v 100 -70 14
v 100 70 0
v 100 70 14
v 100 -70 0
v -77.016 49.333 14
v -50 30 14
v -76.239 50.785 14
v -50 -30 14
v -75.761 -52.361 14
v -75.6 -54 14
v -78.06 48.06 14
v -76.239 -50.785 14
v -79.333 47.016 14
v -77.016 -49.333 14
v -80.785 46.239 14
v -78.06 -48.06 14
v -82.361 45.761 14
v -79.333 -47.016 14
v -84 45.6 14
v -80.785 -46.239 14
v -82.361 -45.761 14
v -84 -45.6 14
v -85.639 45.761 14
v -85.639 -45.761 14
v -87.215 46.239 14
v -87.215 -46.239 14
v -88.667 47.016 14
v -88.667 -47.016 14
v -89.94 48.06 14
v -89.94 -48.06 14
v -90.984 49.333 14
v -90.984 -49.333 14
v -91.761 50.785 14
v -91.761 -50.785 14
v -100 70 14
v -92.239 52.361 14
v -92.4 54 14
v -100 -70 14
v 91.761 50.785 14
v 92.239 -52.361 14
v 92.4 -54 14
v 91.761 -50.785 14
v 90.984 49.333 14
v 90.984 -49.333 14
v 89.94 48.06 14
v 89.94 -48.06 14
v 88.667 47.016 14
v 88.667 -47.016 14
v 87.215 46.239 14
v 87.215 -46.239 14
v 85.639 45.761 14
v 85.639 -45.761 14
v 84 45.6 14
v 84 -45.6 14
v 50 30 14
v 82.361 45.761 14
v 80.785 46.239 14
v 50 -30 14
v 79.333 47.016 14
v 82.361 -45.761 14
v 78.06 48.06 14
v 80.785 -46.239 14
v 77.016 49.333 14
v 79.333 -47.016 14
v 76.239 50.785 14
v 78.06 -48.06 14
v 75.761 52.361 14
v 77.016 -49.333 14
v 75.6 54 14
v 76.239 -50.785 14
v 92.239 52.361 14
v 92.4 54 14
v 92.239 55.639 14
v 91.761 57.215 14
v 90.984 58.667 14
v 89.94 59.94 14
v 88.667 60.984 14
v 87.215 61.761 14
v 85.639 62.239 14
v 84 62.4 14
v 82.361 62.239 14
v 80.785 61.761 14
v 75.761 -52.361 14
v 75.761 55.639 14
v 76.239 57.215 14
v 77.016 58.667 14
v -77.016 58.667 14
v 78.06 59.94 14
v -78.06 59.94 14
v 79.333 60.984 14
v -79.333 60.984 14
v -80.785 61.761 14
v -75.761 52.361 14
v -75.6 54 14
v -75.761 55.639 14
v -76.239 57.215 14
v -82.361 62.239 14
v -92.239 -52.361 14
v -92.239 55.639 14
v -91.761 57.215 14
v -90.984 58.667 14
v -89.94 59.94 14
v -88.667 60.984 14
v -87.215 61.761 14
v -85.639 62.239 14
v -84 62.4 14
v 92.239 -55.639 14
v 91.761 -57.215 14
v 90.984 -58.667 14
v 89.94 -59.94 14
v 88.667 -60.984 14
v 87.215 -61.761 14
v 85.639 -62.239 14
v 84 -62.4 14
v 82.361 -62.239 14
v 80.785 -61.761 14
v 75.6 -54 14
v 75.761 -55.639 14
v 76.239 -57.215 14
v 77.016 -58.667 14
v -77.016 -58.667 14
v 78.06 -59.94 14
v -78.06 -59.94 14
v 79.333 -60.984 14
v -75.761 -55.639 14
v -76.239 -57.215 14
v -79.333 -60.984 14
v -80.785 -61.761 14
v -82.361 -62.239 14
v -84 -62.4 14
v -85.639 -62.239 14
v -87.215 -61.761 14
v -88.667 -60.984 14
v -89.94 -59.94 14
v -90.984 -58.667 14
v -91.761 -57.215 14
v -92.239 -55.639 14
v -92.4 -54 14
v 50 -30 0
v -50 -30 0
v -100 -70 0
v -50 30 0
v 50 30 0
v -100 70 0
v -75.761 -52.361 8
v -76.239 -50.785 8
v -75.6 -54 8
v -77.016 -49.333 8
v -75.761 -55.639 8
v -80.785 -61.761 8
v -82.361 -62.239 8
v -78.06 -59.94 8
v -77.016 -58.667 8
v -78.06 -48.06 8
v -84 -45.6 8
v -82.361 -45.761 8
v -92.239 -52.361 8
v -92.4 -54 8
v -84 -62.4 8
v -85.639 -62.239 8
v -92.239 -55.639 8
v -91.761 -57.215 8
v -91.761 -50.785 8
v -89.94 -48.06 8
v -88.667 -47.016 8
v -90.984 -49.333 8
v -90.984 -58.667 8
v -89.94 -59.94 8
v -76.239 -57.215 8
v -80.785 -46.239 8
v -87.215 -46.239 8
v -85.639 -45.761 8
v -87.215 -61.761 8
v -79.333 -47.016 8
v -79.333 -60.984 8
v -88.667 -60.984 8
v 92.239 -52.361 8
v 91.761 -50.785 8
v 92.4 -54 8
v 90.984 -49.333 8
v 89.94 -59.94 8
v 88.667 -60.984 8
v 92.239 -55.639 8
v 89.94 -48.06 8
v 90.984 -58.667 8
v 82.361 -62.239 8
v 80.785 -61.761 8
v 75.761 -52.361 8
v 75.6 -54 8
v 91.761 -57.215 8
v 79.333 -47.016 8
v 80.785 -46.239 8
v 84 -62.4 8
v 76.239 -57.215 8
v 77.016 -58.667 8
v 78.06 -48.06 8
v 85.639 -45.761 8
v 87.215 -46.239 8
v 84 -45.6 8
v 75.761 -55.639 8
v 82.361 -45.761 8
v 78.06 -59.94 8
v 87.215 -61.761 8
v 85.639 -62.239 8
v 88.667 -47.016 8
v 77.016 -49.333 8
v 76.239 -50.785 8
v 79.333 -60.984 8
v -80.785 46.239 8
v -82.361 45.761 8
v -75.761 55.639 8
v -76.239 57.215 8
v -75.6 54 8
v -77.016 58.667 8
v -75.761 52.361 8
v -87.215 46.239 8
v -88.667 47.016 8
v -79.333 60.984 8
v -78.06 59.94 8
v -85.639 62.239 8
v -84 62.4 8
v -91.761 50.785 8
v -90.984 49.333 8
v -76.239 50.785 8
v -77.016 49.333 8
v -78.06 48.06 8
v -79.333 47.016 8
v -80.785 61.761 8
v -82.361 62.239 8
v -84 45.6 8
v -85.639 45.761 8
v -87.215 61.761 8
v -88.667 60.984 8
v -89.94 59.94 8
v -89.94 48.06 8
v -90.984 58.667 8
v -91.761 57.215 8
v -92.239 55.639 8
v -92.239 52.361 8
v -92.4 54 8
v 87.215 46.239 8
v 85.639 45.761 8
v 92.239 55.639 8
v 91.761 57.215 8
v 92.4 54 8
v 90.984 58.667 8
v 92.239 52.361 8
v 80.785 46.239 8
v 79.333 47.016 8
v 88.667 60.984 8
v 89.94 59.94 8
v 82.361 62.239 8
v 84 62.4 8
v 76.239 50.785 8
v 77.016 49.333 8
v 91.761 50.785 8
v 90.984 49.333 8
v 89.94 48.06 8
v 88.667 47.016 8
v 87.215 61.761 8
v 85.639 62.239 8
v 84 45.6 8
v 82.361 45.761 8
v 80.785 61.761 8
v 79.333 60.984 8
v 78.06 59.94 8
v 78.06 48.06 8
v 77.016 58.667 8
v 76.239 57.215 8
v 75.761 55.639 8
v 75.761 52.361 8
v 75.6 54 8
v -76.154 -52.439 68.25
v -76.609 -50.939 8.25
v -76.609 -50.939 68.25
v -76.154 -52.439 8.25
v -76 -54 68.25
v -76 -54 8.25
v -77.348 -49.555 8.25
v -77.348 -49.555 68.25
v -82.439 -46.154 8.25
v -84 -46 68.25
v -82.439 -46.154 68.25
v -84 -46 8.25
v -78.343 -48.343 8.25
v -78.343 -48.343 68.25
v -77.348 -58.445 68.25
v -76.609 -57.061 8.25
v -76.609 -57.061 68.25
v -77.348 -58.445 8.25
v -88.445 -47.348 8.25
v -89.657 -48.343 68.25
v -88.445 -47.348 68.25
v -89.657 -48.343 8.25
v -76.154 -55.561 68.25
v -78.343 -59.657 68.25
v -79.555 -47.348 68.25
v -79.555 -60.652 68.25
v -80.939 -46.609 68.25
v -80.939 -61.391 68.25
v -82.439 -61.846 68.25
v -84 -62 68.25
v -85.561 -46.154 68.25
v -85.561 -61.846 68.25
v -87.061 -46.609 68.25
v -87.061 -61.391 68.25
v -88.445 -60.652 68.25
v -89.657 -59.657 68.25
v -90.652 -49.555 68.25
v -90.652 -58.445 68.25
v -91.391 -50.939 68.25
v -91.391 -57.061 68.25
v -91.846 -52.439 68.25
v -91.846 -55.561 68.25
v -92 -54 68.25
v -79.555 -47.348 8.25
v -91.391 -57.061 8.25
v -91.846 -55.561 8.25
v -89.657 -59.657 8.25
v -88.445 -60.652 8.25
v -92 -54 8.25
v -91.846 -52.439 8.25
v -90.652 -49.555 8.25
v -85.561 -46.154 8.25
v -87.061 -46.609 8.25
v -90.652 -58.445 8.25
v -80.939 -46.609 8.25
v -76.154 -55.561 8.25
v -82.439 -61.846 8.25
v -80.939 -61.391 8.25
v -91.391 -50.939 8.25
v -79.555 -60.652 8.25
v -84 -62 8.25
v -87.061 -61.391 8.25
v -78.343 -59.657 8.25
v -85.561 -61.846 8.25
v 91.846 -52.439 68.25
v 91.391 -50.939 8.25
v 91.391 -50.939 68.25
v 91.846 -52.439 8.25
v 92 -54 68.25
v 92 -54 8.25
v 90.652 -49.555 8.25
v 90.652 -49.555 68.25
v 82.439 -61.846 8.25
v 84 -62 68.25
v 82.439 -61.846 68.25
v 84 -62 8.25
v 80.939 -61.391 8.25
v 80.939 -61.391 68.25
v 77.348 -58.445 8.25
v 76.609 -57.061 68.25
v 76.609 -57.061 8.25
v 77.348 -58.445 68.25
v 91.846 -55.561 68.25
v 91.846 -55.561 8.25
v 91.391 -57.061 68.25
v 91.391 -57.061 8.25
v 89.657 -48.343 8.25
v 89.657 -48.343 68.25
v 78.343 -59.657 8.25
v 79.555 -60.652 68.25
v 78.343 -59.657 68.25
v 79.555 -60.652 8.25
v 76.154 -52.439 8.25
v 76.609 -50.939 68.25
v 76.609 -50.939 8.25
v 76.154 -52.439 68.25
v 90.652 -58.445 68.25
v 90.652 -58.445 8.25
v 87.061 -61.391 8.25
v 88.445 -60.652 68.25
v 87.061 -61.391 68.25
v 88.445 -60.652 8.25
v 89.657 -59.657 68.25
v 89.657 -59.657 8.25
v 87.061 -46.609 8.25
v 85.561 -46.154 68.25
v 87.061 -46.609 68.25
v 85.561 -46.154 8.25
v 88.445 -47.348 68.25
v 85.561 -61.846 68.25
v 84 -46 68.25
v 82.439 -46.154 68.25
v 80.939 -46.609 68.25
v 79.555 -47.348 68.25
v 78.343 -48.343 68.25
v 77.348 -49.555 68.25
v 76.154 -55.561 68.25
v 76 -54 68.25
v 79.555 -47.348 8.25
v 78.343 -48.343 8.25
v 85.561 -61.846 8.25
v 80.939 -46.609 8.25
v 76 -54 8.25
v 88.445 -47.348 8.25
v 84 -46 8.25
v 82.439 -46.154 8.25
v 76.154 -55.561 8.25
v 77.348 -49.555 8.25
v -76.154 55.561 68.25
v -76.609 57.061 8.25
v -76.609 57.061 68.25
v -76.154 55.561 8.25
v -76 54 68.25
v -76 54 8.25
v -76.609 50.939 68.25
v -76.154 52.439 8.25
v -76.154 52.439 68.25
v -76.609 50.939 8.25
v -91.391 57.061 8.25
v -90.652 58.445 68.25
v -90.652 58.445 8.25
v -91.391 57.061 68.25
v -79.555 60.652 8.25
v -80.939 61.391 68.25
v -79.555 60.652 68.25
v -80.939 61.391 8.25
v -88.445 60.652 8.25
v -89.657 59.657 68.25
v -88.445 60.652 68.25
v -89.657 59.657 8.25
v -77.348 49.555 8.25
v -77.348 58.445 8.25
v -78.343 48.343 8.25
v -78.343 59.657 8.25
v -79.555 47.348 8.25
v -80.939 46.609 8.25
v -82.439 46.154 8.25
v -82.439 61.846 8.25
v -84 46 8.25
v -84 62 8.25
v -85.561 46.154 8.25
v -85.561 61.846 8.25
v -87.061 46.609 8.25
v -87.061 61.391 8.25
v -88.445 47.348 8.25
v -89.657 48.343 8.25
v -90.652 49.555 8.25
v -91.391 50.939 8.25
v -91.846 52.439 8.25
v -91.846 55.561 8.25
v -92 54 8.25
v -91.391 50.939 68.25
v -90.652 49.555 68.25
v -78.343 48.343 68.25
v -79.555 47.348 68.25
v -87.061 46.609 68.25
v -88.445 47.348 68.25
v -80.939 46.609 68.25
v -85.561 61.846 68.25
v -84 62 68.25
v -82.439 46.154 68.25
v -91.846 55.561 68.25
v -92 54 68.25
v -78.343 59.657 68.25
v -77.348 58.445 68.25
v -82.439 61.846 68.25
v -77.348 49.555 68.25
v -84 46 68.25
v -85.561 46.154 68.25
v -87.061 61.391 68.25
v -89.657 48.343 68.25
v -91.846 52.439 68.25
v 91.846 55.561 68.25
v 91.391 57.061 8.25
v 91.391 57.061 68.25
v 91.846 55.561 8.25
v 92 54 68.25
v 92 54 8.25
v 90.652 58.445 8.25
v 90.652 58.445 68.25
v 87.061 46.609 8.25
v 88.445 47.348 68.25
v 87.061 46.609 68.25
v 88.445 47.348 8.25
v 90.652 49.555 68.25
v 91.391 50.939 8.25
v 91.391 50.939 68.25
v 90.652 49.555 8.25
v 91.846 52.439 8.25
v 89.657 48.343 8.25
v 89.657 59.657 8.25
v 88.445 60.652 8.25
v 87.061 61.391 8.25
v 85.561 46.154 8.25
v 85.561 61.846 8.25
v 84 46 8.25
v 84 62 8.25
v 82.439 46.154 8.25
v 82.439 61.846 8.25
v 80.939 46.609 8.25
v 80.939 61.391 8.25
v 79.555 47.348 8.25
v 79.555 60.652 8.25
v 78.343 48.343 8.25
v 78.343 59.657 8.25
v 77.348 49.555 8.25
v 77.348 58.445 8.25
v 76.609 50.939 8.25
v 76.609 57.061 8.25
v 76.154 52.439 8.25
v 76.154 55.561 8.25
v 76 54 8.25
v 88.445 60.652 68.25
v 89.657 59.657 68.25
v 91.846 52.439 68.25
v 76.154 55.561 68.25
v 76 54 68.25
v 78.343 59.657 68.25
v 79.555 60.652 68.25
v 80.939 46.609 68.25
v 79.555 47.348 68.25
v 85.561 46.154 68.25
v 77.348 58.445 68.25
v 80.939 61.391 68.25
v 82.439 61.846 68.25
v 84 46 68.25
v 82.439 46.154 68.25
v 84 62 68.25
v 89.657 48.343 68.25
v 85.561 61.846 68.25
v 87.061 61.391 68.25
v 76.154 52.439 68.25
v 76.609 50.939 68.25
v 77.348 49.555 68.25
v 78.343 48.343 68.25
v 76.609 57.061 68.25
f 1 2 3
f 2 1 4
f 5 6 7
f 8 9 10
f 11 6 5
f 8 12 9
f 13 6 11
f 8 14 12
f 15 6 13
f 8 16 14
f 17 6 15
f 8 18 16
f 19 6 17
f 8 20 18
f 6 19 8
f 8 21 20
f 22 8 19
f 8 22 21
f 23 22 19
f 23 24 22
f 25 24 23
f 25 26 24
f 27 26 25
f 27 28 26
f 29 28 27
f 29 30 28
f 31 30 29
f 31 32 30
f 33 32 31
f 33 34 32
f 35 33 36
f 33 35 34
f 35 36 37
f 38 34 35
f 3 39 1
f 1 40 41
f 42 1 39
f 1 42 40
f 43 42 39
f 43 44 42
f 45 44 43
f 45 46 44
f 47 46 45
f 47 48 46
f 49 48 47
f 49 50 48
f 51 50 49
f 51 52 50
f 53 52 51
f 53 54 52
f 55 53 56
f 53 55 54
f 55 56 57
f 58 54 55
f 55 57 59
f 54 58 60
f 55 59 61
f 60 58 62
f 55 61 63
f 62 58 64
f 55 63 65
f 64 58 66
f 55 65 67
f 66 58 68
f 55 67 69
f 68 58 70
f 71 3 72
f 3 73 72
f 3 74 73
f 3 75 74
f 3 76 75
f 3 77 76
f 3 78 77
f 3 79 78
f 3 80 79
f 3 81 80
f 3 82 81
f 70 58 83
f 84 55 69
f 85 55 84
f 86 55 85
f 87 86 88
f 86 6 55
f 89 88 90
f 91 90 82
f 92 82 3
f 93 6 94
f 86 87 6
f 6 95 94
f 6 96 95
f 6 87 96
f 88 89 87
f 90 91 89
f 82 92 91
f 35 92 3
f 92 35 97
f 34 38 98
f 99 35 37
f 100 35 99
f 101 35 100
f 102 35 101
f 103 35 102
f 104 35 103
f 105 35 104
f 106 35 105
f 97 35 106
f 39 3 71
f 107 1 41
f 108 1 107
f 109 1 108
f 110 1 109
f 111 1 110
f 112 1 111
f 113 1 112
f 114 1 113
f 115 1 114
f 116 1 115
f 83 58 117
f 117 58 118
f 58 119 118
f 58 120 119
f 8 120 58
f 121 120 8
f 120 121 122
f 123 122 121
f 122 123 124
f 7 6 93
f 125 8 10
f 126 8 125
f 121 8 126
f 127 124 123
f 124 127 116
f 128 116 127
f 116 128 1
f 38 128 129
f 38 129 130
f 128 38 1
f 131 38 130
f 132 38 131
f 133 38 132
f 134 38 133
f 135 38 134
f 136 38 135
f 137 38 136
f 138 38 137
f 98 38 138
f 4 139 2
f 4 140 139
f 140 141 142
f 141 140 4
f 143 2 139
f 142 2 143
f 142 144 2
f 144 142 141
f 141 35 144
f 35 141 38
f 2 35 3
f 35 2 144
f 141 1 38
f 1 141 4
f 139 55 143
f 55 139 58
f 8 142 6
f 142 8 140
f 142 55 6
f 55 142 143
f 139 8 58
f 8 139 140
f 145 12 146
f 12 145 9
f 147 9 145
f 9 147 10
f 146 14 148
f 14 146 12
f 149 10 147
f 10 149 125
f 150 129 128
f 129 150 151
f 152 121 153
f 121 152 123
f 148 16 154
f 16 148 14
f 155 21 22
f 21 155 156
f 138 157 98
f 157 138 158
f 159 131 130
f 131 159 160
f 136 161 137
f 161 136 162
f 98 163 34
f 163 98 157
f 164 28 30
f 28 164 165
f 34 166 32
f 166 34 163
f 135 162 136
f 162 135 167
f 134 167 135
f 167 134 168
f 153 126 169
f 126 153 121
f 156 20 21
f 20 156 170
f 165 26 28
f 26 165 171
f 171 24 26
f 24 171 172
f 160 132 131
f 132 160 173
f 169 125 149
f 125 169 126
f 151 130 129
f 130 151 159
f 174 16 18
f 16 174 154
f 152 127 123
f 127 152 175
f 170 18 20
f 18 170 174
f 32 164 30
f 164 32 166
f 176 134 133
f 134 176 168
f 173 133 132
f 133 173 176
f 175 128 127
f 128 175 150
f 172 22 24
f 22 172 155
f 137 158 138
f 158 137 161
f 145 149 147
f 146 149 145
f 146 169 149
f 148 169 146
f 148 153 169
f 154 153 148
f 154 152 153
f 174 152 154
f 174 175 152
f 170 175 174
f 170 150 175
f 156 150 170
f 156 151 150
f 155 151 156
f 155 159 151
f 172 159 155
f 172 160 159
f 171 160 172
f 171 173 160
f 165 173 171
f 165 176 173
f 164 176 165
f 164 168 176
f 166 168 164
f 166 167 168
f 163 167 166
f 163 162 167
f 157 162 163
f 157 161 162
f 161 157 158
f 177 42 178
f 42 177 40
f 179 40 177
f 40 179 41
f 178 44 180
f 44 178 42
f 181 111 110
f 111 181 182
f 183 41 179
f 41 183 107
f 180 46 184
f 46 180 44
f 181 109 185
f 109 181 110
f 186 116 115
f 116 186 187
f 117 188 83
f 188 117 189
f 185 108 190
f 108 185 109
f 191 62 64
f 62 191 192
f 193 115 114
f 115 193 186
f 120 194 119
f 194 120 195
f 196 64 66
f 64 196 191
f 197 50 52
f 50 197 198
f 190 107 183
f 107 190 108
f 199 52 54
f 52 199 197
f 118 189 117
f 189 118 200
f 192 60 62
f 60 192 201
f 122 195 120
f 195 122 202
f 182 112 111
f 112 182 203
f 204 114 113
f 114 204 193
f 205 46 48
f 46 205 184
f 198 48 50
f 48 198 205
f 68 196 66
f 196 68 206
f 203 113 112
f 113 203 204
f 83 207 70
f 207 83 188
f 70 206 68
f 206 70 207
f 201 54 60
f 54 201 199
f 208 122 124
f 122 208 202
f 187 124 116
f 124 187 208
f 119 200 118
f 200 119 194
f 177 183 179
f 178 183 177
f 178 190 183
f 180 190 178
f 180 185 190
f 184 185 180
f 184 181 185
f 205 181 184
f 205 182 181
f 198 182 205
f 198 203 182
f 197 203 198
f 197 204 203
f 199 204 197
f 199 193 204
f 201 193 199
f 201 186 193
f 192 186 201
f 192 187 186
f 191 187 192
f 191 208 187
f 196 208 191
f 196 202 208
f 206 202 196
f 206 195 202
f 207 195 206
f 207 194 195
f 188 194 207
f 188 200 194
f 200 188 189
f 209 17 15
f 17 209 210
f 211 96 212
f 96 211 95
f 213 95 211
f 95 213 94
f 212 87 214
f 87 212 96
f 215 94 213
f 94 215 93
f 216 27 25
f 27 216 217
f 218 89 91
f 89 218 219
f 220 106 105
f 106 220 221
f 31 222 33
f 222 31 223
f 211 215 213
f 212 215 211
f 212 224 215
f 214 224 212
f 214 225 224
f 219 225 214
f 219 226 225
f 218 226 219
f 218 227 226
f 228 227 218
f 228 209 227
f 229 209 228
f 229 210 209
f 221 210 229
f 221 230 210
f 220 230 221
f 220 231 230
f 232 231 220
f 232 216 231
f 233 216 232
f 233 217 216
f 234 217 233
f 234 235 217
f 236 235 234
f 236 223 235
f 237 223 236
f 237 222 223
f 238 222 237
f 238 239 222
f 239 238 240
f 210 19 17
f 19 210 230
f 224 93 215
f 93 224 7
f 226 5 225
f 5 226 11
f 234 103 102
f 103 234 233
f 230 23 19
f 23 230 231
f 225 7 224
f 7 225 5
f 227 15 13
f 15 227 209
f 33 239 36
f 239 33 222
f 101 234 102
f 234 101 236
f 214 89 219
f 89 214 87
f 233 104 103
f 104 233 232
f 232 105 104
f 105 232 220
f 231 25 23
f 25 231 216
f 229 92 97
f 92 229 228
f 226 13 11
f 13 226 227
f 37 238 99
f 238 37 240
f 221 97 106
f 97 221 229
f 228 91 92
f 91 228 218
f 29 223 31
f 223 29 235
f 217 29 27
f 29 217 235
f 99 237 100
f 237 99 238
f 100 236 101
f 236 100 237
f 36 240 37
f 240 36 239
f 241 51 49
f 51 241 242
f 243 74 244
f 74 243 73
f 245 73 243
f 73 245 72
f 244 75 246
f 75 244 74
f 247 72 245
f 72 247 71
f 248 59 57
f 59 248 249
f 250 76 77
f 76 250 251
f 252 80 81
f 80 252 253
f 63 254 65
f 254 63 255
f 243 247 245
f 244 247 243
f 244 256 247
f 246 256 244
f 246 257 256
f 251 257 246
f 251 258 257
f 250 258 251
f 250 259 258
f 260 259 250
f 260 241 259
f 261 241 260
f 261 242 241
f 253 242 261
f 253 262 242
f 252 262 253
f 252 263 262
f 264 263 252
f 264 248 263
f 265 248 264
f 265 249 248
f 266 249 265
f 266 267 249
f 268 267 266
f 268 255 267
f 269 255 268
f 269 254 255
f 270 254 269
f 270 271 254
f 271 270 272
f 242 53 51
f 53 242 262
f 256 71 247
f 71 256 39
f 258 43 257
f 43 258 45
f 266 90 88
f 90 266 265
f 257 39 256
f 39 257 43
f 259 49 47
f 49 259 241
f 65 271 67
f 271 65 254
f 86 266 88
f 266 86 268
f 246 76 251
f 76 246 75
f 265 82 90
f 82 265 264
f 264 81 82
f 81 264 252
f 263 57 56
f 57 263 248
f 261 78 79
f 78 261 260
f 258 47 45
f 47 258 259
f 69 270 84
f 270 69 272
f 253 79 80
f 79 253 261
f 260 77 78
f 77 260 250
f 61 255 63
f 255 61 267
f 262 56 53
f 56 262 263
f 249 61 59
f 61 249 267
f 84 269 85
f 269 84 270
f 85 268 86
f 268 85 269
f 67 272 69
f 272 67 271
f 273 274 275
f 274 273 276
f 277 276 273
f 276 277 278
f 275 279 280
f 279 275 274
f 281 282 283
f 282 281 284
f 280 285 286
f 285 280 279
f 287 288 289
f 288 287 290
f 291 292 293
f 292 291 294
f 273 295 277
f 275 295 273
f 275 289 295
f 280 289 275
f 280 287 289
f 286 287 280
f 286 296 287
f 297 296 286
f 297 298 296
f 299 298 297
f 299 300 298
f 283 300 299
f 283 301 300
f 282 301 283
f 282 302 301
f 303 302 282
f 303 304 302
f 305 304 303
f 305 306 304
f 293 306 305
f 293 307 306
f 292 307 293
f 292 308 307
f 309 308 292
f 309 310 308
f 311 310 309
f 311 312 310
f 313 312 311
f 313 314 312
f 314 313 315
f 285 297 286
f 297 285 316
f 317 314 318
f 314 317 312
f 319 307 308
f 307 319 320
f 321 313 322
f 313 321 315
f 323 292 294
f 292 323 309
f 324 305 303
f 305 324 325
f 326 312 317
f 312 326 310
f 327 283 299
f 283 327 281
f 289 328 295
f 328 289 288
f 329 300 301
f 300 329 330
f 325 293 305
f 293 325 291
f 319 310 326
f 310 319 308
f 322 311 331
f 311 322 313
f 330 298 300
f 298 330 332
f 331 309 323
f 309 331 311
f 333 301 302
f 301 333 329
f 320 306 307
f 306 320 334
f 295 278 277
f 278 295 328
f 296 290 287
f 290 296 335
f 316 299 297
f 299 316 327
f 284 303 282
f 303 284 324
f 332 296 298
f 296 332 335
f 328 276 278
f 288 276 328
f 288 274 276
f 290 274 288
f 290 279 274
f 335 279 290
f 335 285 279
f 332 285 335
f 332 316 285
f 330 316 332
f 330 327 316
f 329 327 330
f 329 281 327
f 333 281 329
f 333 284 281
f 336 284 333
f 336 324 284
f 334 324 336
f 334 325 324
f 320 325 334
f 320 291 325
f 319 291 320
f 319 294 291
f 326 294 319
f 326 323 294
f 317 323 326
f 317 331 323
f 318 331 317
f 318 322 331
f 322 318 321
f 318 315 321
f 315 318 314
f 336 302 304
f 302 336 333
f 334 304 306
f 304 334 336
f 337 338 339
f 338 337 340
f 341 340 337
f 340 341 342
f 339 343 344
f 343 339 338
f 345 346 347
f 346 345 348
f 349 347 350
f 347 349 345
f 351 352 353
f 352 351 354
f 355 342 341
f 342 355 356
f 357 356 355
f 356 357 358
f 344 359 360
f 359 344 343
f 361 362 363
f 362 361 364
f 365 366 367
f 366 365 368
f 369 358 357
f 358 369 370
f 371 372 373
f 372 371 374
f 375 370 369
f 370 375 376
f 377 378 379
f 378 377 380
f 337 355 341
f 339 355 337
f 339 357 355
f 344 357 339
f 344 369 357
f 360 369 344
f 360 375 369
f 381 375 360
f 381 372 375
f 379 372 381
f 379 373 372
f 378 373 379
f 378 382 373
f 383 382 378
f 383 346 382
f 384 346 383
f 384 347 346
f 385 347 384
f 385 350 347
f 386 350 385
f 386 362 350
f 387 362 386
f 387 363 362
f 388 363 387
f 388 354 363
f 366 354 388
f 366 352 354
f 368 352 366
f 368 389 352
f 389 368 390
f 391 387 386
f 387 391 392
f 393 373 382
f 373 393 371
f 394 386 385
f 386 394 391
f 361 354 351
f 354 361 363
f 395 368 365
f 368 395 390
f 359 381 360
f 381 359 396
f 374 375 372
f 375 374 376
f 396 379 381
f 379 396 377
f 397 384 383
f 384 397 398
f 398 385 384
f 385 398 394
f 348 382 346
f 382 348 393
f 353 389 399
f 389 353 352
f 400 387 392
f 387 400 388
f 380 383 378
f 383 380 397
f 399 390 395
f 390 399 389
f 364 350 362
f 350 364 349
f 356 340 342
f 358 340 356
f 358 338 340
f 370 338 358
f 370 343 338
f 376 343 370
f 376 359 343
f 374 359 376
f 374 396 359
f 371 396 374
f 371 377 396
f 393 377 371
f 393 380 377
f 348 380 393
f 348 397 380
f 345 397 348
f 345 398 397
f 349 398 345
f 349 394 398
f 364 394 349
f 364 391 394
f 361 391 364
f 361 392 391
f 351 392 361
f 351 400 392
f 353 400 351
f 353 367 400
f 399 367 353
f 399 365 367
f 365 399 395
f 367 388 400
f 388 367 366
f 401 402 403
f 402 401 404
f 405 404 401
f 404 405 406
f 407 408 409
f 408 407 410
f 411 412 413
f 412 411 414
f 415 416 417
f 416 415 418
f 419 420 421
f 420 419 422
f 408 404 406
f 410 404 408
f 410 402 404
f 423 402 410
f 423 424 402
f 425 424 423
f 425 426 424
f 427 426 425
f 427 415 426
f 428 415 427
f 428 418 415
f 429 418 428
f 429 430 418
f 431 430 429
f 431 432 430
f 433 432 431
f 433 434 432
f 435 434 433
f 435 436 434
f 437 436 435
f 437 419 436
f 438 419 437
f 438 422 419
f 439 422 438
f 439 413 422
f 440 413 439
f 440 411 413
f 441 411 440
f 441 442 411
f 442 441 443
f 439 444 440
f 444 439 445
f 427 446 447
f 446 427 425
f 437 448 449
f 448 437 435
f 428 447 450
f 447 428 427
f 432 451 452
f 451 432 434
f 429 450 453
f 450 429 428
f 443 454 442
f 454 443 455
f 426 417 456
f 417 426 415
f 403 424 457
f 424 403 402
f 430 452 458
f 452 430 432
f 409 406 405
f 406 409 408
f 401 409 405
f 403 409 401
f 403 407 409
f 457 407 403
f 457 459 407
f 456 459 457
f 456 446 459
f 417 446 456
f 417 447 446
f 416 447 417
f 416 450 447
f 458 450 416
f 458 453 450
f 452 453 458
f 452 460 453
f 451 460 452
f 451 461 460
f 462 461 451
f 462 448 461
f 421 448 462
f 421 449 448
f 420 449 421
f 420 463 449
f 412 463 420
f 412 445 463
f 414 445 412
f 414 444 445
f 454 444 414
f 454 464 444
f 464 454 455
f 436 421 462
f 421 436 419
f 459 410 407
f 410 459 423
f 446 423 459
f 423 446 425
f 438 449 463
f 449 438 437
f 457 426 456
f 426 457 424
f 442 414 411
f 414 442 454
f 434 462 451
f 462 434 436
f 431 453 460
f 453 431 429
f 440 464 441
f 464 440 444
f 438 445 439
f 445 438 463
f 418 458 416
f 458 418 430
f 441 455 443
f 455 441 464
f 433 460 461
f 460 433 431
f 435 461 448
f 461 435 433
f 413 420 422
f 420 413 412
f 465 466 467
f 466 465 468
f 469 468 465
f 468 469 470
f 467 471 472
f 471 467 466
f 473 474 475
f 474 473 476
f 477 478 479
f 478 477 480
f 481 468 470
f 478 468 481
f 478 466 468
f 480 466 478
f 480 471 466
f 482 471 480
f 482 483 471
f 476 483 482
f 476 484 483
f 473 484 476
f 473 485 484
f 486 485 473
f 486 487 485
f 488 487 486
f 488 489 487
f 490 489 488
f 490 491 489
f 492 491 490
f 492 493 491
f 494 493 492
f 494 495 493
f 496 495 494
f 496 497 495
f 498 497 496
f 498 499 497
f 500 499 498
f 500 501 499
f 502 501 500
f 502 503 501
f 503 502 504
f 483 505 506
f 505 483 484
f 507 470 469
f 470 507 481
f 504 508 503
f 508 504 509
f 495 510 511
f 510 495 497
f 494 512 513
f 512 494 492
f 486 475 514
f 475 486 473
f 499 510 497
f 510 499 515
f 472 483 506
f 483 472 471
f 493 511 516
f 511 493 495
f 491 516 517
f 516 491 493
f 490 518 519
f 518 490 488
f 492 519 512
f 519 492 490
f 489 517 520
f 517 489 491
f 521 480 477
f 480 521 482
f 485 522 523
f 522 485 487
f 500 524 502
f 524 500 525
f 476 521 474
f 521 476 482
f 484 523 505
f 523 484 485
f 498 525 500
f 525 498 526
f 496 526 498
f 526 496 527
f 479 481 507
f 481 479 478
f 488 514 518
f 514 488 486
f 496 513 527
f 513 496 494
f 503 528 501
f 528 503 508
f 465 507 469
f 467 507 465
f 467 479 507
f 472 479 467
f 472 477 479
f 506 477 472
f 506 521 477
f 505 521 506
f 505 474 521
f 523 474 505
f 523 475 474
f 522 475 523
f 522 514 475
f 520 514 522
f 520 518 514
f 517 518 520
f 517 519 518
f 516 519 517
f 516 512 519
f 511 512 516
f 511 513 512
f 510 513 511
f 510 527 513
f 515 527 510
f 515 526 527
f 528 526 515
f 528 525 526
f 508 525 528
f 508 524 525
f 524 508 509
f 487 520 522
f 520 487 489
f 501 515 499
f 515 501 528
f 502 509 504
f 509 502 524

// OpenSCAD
$fn = 32;

// ------------------------------------------------------------------------
// Frame with four posts: 200 x 140 mm frame, four d16 posts
// Every part is its own module, assembly() places them once.
// ------------------------------------------------------------------------

// --- part 1 ---
module base_frame() {
  difference() {
    translate([-100, -70, 0]) cube([200, 140, 14]);
    translate([-50, -30, -1]) cube([100, 60, 16]);
    translate([-84, -54, 8]) cylinder(h = 7, d = 16.8);
    translate([84, -54, 8]) cylinder(h = 7, d = 16.8);
    translate([-84, 54, 8]) cylinder(h = 7, d = 16.8);
    translate([84, 54, 8]) cylinder(h = 7, d = 16.8);
  }
}

// --- part 2 ---
module post1() {
  cylinder(h = 60, d = 16);
}

// --- part 3 ---
module post2() {
  cylinder(h = 60, d = 16);
}

// --- part 4 ---
module post3() {
  cylinder(h = 60, d = 16);
}

// --- part 5 ---
module post4() {
  cylinder(h = 60, d = 16);
}

// --- assembly ---
module assembly() {
  translate([0, 0, 0]) rotate([0, 0, 0]) base_frame();
  translate([-84, -54, 8.25]) rotate([0, 0, 0]) post1();
  translate([84, -54, 8.25]) rotate([0, 0, 0]) post2();
  translate([-84, 54, 8.25]) rotate([0, 0, 0]) post3();
  translate([84, 54, 8.25]) rotate([0, 0, 0]) post4();
}

assembly();
